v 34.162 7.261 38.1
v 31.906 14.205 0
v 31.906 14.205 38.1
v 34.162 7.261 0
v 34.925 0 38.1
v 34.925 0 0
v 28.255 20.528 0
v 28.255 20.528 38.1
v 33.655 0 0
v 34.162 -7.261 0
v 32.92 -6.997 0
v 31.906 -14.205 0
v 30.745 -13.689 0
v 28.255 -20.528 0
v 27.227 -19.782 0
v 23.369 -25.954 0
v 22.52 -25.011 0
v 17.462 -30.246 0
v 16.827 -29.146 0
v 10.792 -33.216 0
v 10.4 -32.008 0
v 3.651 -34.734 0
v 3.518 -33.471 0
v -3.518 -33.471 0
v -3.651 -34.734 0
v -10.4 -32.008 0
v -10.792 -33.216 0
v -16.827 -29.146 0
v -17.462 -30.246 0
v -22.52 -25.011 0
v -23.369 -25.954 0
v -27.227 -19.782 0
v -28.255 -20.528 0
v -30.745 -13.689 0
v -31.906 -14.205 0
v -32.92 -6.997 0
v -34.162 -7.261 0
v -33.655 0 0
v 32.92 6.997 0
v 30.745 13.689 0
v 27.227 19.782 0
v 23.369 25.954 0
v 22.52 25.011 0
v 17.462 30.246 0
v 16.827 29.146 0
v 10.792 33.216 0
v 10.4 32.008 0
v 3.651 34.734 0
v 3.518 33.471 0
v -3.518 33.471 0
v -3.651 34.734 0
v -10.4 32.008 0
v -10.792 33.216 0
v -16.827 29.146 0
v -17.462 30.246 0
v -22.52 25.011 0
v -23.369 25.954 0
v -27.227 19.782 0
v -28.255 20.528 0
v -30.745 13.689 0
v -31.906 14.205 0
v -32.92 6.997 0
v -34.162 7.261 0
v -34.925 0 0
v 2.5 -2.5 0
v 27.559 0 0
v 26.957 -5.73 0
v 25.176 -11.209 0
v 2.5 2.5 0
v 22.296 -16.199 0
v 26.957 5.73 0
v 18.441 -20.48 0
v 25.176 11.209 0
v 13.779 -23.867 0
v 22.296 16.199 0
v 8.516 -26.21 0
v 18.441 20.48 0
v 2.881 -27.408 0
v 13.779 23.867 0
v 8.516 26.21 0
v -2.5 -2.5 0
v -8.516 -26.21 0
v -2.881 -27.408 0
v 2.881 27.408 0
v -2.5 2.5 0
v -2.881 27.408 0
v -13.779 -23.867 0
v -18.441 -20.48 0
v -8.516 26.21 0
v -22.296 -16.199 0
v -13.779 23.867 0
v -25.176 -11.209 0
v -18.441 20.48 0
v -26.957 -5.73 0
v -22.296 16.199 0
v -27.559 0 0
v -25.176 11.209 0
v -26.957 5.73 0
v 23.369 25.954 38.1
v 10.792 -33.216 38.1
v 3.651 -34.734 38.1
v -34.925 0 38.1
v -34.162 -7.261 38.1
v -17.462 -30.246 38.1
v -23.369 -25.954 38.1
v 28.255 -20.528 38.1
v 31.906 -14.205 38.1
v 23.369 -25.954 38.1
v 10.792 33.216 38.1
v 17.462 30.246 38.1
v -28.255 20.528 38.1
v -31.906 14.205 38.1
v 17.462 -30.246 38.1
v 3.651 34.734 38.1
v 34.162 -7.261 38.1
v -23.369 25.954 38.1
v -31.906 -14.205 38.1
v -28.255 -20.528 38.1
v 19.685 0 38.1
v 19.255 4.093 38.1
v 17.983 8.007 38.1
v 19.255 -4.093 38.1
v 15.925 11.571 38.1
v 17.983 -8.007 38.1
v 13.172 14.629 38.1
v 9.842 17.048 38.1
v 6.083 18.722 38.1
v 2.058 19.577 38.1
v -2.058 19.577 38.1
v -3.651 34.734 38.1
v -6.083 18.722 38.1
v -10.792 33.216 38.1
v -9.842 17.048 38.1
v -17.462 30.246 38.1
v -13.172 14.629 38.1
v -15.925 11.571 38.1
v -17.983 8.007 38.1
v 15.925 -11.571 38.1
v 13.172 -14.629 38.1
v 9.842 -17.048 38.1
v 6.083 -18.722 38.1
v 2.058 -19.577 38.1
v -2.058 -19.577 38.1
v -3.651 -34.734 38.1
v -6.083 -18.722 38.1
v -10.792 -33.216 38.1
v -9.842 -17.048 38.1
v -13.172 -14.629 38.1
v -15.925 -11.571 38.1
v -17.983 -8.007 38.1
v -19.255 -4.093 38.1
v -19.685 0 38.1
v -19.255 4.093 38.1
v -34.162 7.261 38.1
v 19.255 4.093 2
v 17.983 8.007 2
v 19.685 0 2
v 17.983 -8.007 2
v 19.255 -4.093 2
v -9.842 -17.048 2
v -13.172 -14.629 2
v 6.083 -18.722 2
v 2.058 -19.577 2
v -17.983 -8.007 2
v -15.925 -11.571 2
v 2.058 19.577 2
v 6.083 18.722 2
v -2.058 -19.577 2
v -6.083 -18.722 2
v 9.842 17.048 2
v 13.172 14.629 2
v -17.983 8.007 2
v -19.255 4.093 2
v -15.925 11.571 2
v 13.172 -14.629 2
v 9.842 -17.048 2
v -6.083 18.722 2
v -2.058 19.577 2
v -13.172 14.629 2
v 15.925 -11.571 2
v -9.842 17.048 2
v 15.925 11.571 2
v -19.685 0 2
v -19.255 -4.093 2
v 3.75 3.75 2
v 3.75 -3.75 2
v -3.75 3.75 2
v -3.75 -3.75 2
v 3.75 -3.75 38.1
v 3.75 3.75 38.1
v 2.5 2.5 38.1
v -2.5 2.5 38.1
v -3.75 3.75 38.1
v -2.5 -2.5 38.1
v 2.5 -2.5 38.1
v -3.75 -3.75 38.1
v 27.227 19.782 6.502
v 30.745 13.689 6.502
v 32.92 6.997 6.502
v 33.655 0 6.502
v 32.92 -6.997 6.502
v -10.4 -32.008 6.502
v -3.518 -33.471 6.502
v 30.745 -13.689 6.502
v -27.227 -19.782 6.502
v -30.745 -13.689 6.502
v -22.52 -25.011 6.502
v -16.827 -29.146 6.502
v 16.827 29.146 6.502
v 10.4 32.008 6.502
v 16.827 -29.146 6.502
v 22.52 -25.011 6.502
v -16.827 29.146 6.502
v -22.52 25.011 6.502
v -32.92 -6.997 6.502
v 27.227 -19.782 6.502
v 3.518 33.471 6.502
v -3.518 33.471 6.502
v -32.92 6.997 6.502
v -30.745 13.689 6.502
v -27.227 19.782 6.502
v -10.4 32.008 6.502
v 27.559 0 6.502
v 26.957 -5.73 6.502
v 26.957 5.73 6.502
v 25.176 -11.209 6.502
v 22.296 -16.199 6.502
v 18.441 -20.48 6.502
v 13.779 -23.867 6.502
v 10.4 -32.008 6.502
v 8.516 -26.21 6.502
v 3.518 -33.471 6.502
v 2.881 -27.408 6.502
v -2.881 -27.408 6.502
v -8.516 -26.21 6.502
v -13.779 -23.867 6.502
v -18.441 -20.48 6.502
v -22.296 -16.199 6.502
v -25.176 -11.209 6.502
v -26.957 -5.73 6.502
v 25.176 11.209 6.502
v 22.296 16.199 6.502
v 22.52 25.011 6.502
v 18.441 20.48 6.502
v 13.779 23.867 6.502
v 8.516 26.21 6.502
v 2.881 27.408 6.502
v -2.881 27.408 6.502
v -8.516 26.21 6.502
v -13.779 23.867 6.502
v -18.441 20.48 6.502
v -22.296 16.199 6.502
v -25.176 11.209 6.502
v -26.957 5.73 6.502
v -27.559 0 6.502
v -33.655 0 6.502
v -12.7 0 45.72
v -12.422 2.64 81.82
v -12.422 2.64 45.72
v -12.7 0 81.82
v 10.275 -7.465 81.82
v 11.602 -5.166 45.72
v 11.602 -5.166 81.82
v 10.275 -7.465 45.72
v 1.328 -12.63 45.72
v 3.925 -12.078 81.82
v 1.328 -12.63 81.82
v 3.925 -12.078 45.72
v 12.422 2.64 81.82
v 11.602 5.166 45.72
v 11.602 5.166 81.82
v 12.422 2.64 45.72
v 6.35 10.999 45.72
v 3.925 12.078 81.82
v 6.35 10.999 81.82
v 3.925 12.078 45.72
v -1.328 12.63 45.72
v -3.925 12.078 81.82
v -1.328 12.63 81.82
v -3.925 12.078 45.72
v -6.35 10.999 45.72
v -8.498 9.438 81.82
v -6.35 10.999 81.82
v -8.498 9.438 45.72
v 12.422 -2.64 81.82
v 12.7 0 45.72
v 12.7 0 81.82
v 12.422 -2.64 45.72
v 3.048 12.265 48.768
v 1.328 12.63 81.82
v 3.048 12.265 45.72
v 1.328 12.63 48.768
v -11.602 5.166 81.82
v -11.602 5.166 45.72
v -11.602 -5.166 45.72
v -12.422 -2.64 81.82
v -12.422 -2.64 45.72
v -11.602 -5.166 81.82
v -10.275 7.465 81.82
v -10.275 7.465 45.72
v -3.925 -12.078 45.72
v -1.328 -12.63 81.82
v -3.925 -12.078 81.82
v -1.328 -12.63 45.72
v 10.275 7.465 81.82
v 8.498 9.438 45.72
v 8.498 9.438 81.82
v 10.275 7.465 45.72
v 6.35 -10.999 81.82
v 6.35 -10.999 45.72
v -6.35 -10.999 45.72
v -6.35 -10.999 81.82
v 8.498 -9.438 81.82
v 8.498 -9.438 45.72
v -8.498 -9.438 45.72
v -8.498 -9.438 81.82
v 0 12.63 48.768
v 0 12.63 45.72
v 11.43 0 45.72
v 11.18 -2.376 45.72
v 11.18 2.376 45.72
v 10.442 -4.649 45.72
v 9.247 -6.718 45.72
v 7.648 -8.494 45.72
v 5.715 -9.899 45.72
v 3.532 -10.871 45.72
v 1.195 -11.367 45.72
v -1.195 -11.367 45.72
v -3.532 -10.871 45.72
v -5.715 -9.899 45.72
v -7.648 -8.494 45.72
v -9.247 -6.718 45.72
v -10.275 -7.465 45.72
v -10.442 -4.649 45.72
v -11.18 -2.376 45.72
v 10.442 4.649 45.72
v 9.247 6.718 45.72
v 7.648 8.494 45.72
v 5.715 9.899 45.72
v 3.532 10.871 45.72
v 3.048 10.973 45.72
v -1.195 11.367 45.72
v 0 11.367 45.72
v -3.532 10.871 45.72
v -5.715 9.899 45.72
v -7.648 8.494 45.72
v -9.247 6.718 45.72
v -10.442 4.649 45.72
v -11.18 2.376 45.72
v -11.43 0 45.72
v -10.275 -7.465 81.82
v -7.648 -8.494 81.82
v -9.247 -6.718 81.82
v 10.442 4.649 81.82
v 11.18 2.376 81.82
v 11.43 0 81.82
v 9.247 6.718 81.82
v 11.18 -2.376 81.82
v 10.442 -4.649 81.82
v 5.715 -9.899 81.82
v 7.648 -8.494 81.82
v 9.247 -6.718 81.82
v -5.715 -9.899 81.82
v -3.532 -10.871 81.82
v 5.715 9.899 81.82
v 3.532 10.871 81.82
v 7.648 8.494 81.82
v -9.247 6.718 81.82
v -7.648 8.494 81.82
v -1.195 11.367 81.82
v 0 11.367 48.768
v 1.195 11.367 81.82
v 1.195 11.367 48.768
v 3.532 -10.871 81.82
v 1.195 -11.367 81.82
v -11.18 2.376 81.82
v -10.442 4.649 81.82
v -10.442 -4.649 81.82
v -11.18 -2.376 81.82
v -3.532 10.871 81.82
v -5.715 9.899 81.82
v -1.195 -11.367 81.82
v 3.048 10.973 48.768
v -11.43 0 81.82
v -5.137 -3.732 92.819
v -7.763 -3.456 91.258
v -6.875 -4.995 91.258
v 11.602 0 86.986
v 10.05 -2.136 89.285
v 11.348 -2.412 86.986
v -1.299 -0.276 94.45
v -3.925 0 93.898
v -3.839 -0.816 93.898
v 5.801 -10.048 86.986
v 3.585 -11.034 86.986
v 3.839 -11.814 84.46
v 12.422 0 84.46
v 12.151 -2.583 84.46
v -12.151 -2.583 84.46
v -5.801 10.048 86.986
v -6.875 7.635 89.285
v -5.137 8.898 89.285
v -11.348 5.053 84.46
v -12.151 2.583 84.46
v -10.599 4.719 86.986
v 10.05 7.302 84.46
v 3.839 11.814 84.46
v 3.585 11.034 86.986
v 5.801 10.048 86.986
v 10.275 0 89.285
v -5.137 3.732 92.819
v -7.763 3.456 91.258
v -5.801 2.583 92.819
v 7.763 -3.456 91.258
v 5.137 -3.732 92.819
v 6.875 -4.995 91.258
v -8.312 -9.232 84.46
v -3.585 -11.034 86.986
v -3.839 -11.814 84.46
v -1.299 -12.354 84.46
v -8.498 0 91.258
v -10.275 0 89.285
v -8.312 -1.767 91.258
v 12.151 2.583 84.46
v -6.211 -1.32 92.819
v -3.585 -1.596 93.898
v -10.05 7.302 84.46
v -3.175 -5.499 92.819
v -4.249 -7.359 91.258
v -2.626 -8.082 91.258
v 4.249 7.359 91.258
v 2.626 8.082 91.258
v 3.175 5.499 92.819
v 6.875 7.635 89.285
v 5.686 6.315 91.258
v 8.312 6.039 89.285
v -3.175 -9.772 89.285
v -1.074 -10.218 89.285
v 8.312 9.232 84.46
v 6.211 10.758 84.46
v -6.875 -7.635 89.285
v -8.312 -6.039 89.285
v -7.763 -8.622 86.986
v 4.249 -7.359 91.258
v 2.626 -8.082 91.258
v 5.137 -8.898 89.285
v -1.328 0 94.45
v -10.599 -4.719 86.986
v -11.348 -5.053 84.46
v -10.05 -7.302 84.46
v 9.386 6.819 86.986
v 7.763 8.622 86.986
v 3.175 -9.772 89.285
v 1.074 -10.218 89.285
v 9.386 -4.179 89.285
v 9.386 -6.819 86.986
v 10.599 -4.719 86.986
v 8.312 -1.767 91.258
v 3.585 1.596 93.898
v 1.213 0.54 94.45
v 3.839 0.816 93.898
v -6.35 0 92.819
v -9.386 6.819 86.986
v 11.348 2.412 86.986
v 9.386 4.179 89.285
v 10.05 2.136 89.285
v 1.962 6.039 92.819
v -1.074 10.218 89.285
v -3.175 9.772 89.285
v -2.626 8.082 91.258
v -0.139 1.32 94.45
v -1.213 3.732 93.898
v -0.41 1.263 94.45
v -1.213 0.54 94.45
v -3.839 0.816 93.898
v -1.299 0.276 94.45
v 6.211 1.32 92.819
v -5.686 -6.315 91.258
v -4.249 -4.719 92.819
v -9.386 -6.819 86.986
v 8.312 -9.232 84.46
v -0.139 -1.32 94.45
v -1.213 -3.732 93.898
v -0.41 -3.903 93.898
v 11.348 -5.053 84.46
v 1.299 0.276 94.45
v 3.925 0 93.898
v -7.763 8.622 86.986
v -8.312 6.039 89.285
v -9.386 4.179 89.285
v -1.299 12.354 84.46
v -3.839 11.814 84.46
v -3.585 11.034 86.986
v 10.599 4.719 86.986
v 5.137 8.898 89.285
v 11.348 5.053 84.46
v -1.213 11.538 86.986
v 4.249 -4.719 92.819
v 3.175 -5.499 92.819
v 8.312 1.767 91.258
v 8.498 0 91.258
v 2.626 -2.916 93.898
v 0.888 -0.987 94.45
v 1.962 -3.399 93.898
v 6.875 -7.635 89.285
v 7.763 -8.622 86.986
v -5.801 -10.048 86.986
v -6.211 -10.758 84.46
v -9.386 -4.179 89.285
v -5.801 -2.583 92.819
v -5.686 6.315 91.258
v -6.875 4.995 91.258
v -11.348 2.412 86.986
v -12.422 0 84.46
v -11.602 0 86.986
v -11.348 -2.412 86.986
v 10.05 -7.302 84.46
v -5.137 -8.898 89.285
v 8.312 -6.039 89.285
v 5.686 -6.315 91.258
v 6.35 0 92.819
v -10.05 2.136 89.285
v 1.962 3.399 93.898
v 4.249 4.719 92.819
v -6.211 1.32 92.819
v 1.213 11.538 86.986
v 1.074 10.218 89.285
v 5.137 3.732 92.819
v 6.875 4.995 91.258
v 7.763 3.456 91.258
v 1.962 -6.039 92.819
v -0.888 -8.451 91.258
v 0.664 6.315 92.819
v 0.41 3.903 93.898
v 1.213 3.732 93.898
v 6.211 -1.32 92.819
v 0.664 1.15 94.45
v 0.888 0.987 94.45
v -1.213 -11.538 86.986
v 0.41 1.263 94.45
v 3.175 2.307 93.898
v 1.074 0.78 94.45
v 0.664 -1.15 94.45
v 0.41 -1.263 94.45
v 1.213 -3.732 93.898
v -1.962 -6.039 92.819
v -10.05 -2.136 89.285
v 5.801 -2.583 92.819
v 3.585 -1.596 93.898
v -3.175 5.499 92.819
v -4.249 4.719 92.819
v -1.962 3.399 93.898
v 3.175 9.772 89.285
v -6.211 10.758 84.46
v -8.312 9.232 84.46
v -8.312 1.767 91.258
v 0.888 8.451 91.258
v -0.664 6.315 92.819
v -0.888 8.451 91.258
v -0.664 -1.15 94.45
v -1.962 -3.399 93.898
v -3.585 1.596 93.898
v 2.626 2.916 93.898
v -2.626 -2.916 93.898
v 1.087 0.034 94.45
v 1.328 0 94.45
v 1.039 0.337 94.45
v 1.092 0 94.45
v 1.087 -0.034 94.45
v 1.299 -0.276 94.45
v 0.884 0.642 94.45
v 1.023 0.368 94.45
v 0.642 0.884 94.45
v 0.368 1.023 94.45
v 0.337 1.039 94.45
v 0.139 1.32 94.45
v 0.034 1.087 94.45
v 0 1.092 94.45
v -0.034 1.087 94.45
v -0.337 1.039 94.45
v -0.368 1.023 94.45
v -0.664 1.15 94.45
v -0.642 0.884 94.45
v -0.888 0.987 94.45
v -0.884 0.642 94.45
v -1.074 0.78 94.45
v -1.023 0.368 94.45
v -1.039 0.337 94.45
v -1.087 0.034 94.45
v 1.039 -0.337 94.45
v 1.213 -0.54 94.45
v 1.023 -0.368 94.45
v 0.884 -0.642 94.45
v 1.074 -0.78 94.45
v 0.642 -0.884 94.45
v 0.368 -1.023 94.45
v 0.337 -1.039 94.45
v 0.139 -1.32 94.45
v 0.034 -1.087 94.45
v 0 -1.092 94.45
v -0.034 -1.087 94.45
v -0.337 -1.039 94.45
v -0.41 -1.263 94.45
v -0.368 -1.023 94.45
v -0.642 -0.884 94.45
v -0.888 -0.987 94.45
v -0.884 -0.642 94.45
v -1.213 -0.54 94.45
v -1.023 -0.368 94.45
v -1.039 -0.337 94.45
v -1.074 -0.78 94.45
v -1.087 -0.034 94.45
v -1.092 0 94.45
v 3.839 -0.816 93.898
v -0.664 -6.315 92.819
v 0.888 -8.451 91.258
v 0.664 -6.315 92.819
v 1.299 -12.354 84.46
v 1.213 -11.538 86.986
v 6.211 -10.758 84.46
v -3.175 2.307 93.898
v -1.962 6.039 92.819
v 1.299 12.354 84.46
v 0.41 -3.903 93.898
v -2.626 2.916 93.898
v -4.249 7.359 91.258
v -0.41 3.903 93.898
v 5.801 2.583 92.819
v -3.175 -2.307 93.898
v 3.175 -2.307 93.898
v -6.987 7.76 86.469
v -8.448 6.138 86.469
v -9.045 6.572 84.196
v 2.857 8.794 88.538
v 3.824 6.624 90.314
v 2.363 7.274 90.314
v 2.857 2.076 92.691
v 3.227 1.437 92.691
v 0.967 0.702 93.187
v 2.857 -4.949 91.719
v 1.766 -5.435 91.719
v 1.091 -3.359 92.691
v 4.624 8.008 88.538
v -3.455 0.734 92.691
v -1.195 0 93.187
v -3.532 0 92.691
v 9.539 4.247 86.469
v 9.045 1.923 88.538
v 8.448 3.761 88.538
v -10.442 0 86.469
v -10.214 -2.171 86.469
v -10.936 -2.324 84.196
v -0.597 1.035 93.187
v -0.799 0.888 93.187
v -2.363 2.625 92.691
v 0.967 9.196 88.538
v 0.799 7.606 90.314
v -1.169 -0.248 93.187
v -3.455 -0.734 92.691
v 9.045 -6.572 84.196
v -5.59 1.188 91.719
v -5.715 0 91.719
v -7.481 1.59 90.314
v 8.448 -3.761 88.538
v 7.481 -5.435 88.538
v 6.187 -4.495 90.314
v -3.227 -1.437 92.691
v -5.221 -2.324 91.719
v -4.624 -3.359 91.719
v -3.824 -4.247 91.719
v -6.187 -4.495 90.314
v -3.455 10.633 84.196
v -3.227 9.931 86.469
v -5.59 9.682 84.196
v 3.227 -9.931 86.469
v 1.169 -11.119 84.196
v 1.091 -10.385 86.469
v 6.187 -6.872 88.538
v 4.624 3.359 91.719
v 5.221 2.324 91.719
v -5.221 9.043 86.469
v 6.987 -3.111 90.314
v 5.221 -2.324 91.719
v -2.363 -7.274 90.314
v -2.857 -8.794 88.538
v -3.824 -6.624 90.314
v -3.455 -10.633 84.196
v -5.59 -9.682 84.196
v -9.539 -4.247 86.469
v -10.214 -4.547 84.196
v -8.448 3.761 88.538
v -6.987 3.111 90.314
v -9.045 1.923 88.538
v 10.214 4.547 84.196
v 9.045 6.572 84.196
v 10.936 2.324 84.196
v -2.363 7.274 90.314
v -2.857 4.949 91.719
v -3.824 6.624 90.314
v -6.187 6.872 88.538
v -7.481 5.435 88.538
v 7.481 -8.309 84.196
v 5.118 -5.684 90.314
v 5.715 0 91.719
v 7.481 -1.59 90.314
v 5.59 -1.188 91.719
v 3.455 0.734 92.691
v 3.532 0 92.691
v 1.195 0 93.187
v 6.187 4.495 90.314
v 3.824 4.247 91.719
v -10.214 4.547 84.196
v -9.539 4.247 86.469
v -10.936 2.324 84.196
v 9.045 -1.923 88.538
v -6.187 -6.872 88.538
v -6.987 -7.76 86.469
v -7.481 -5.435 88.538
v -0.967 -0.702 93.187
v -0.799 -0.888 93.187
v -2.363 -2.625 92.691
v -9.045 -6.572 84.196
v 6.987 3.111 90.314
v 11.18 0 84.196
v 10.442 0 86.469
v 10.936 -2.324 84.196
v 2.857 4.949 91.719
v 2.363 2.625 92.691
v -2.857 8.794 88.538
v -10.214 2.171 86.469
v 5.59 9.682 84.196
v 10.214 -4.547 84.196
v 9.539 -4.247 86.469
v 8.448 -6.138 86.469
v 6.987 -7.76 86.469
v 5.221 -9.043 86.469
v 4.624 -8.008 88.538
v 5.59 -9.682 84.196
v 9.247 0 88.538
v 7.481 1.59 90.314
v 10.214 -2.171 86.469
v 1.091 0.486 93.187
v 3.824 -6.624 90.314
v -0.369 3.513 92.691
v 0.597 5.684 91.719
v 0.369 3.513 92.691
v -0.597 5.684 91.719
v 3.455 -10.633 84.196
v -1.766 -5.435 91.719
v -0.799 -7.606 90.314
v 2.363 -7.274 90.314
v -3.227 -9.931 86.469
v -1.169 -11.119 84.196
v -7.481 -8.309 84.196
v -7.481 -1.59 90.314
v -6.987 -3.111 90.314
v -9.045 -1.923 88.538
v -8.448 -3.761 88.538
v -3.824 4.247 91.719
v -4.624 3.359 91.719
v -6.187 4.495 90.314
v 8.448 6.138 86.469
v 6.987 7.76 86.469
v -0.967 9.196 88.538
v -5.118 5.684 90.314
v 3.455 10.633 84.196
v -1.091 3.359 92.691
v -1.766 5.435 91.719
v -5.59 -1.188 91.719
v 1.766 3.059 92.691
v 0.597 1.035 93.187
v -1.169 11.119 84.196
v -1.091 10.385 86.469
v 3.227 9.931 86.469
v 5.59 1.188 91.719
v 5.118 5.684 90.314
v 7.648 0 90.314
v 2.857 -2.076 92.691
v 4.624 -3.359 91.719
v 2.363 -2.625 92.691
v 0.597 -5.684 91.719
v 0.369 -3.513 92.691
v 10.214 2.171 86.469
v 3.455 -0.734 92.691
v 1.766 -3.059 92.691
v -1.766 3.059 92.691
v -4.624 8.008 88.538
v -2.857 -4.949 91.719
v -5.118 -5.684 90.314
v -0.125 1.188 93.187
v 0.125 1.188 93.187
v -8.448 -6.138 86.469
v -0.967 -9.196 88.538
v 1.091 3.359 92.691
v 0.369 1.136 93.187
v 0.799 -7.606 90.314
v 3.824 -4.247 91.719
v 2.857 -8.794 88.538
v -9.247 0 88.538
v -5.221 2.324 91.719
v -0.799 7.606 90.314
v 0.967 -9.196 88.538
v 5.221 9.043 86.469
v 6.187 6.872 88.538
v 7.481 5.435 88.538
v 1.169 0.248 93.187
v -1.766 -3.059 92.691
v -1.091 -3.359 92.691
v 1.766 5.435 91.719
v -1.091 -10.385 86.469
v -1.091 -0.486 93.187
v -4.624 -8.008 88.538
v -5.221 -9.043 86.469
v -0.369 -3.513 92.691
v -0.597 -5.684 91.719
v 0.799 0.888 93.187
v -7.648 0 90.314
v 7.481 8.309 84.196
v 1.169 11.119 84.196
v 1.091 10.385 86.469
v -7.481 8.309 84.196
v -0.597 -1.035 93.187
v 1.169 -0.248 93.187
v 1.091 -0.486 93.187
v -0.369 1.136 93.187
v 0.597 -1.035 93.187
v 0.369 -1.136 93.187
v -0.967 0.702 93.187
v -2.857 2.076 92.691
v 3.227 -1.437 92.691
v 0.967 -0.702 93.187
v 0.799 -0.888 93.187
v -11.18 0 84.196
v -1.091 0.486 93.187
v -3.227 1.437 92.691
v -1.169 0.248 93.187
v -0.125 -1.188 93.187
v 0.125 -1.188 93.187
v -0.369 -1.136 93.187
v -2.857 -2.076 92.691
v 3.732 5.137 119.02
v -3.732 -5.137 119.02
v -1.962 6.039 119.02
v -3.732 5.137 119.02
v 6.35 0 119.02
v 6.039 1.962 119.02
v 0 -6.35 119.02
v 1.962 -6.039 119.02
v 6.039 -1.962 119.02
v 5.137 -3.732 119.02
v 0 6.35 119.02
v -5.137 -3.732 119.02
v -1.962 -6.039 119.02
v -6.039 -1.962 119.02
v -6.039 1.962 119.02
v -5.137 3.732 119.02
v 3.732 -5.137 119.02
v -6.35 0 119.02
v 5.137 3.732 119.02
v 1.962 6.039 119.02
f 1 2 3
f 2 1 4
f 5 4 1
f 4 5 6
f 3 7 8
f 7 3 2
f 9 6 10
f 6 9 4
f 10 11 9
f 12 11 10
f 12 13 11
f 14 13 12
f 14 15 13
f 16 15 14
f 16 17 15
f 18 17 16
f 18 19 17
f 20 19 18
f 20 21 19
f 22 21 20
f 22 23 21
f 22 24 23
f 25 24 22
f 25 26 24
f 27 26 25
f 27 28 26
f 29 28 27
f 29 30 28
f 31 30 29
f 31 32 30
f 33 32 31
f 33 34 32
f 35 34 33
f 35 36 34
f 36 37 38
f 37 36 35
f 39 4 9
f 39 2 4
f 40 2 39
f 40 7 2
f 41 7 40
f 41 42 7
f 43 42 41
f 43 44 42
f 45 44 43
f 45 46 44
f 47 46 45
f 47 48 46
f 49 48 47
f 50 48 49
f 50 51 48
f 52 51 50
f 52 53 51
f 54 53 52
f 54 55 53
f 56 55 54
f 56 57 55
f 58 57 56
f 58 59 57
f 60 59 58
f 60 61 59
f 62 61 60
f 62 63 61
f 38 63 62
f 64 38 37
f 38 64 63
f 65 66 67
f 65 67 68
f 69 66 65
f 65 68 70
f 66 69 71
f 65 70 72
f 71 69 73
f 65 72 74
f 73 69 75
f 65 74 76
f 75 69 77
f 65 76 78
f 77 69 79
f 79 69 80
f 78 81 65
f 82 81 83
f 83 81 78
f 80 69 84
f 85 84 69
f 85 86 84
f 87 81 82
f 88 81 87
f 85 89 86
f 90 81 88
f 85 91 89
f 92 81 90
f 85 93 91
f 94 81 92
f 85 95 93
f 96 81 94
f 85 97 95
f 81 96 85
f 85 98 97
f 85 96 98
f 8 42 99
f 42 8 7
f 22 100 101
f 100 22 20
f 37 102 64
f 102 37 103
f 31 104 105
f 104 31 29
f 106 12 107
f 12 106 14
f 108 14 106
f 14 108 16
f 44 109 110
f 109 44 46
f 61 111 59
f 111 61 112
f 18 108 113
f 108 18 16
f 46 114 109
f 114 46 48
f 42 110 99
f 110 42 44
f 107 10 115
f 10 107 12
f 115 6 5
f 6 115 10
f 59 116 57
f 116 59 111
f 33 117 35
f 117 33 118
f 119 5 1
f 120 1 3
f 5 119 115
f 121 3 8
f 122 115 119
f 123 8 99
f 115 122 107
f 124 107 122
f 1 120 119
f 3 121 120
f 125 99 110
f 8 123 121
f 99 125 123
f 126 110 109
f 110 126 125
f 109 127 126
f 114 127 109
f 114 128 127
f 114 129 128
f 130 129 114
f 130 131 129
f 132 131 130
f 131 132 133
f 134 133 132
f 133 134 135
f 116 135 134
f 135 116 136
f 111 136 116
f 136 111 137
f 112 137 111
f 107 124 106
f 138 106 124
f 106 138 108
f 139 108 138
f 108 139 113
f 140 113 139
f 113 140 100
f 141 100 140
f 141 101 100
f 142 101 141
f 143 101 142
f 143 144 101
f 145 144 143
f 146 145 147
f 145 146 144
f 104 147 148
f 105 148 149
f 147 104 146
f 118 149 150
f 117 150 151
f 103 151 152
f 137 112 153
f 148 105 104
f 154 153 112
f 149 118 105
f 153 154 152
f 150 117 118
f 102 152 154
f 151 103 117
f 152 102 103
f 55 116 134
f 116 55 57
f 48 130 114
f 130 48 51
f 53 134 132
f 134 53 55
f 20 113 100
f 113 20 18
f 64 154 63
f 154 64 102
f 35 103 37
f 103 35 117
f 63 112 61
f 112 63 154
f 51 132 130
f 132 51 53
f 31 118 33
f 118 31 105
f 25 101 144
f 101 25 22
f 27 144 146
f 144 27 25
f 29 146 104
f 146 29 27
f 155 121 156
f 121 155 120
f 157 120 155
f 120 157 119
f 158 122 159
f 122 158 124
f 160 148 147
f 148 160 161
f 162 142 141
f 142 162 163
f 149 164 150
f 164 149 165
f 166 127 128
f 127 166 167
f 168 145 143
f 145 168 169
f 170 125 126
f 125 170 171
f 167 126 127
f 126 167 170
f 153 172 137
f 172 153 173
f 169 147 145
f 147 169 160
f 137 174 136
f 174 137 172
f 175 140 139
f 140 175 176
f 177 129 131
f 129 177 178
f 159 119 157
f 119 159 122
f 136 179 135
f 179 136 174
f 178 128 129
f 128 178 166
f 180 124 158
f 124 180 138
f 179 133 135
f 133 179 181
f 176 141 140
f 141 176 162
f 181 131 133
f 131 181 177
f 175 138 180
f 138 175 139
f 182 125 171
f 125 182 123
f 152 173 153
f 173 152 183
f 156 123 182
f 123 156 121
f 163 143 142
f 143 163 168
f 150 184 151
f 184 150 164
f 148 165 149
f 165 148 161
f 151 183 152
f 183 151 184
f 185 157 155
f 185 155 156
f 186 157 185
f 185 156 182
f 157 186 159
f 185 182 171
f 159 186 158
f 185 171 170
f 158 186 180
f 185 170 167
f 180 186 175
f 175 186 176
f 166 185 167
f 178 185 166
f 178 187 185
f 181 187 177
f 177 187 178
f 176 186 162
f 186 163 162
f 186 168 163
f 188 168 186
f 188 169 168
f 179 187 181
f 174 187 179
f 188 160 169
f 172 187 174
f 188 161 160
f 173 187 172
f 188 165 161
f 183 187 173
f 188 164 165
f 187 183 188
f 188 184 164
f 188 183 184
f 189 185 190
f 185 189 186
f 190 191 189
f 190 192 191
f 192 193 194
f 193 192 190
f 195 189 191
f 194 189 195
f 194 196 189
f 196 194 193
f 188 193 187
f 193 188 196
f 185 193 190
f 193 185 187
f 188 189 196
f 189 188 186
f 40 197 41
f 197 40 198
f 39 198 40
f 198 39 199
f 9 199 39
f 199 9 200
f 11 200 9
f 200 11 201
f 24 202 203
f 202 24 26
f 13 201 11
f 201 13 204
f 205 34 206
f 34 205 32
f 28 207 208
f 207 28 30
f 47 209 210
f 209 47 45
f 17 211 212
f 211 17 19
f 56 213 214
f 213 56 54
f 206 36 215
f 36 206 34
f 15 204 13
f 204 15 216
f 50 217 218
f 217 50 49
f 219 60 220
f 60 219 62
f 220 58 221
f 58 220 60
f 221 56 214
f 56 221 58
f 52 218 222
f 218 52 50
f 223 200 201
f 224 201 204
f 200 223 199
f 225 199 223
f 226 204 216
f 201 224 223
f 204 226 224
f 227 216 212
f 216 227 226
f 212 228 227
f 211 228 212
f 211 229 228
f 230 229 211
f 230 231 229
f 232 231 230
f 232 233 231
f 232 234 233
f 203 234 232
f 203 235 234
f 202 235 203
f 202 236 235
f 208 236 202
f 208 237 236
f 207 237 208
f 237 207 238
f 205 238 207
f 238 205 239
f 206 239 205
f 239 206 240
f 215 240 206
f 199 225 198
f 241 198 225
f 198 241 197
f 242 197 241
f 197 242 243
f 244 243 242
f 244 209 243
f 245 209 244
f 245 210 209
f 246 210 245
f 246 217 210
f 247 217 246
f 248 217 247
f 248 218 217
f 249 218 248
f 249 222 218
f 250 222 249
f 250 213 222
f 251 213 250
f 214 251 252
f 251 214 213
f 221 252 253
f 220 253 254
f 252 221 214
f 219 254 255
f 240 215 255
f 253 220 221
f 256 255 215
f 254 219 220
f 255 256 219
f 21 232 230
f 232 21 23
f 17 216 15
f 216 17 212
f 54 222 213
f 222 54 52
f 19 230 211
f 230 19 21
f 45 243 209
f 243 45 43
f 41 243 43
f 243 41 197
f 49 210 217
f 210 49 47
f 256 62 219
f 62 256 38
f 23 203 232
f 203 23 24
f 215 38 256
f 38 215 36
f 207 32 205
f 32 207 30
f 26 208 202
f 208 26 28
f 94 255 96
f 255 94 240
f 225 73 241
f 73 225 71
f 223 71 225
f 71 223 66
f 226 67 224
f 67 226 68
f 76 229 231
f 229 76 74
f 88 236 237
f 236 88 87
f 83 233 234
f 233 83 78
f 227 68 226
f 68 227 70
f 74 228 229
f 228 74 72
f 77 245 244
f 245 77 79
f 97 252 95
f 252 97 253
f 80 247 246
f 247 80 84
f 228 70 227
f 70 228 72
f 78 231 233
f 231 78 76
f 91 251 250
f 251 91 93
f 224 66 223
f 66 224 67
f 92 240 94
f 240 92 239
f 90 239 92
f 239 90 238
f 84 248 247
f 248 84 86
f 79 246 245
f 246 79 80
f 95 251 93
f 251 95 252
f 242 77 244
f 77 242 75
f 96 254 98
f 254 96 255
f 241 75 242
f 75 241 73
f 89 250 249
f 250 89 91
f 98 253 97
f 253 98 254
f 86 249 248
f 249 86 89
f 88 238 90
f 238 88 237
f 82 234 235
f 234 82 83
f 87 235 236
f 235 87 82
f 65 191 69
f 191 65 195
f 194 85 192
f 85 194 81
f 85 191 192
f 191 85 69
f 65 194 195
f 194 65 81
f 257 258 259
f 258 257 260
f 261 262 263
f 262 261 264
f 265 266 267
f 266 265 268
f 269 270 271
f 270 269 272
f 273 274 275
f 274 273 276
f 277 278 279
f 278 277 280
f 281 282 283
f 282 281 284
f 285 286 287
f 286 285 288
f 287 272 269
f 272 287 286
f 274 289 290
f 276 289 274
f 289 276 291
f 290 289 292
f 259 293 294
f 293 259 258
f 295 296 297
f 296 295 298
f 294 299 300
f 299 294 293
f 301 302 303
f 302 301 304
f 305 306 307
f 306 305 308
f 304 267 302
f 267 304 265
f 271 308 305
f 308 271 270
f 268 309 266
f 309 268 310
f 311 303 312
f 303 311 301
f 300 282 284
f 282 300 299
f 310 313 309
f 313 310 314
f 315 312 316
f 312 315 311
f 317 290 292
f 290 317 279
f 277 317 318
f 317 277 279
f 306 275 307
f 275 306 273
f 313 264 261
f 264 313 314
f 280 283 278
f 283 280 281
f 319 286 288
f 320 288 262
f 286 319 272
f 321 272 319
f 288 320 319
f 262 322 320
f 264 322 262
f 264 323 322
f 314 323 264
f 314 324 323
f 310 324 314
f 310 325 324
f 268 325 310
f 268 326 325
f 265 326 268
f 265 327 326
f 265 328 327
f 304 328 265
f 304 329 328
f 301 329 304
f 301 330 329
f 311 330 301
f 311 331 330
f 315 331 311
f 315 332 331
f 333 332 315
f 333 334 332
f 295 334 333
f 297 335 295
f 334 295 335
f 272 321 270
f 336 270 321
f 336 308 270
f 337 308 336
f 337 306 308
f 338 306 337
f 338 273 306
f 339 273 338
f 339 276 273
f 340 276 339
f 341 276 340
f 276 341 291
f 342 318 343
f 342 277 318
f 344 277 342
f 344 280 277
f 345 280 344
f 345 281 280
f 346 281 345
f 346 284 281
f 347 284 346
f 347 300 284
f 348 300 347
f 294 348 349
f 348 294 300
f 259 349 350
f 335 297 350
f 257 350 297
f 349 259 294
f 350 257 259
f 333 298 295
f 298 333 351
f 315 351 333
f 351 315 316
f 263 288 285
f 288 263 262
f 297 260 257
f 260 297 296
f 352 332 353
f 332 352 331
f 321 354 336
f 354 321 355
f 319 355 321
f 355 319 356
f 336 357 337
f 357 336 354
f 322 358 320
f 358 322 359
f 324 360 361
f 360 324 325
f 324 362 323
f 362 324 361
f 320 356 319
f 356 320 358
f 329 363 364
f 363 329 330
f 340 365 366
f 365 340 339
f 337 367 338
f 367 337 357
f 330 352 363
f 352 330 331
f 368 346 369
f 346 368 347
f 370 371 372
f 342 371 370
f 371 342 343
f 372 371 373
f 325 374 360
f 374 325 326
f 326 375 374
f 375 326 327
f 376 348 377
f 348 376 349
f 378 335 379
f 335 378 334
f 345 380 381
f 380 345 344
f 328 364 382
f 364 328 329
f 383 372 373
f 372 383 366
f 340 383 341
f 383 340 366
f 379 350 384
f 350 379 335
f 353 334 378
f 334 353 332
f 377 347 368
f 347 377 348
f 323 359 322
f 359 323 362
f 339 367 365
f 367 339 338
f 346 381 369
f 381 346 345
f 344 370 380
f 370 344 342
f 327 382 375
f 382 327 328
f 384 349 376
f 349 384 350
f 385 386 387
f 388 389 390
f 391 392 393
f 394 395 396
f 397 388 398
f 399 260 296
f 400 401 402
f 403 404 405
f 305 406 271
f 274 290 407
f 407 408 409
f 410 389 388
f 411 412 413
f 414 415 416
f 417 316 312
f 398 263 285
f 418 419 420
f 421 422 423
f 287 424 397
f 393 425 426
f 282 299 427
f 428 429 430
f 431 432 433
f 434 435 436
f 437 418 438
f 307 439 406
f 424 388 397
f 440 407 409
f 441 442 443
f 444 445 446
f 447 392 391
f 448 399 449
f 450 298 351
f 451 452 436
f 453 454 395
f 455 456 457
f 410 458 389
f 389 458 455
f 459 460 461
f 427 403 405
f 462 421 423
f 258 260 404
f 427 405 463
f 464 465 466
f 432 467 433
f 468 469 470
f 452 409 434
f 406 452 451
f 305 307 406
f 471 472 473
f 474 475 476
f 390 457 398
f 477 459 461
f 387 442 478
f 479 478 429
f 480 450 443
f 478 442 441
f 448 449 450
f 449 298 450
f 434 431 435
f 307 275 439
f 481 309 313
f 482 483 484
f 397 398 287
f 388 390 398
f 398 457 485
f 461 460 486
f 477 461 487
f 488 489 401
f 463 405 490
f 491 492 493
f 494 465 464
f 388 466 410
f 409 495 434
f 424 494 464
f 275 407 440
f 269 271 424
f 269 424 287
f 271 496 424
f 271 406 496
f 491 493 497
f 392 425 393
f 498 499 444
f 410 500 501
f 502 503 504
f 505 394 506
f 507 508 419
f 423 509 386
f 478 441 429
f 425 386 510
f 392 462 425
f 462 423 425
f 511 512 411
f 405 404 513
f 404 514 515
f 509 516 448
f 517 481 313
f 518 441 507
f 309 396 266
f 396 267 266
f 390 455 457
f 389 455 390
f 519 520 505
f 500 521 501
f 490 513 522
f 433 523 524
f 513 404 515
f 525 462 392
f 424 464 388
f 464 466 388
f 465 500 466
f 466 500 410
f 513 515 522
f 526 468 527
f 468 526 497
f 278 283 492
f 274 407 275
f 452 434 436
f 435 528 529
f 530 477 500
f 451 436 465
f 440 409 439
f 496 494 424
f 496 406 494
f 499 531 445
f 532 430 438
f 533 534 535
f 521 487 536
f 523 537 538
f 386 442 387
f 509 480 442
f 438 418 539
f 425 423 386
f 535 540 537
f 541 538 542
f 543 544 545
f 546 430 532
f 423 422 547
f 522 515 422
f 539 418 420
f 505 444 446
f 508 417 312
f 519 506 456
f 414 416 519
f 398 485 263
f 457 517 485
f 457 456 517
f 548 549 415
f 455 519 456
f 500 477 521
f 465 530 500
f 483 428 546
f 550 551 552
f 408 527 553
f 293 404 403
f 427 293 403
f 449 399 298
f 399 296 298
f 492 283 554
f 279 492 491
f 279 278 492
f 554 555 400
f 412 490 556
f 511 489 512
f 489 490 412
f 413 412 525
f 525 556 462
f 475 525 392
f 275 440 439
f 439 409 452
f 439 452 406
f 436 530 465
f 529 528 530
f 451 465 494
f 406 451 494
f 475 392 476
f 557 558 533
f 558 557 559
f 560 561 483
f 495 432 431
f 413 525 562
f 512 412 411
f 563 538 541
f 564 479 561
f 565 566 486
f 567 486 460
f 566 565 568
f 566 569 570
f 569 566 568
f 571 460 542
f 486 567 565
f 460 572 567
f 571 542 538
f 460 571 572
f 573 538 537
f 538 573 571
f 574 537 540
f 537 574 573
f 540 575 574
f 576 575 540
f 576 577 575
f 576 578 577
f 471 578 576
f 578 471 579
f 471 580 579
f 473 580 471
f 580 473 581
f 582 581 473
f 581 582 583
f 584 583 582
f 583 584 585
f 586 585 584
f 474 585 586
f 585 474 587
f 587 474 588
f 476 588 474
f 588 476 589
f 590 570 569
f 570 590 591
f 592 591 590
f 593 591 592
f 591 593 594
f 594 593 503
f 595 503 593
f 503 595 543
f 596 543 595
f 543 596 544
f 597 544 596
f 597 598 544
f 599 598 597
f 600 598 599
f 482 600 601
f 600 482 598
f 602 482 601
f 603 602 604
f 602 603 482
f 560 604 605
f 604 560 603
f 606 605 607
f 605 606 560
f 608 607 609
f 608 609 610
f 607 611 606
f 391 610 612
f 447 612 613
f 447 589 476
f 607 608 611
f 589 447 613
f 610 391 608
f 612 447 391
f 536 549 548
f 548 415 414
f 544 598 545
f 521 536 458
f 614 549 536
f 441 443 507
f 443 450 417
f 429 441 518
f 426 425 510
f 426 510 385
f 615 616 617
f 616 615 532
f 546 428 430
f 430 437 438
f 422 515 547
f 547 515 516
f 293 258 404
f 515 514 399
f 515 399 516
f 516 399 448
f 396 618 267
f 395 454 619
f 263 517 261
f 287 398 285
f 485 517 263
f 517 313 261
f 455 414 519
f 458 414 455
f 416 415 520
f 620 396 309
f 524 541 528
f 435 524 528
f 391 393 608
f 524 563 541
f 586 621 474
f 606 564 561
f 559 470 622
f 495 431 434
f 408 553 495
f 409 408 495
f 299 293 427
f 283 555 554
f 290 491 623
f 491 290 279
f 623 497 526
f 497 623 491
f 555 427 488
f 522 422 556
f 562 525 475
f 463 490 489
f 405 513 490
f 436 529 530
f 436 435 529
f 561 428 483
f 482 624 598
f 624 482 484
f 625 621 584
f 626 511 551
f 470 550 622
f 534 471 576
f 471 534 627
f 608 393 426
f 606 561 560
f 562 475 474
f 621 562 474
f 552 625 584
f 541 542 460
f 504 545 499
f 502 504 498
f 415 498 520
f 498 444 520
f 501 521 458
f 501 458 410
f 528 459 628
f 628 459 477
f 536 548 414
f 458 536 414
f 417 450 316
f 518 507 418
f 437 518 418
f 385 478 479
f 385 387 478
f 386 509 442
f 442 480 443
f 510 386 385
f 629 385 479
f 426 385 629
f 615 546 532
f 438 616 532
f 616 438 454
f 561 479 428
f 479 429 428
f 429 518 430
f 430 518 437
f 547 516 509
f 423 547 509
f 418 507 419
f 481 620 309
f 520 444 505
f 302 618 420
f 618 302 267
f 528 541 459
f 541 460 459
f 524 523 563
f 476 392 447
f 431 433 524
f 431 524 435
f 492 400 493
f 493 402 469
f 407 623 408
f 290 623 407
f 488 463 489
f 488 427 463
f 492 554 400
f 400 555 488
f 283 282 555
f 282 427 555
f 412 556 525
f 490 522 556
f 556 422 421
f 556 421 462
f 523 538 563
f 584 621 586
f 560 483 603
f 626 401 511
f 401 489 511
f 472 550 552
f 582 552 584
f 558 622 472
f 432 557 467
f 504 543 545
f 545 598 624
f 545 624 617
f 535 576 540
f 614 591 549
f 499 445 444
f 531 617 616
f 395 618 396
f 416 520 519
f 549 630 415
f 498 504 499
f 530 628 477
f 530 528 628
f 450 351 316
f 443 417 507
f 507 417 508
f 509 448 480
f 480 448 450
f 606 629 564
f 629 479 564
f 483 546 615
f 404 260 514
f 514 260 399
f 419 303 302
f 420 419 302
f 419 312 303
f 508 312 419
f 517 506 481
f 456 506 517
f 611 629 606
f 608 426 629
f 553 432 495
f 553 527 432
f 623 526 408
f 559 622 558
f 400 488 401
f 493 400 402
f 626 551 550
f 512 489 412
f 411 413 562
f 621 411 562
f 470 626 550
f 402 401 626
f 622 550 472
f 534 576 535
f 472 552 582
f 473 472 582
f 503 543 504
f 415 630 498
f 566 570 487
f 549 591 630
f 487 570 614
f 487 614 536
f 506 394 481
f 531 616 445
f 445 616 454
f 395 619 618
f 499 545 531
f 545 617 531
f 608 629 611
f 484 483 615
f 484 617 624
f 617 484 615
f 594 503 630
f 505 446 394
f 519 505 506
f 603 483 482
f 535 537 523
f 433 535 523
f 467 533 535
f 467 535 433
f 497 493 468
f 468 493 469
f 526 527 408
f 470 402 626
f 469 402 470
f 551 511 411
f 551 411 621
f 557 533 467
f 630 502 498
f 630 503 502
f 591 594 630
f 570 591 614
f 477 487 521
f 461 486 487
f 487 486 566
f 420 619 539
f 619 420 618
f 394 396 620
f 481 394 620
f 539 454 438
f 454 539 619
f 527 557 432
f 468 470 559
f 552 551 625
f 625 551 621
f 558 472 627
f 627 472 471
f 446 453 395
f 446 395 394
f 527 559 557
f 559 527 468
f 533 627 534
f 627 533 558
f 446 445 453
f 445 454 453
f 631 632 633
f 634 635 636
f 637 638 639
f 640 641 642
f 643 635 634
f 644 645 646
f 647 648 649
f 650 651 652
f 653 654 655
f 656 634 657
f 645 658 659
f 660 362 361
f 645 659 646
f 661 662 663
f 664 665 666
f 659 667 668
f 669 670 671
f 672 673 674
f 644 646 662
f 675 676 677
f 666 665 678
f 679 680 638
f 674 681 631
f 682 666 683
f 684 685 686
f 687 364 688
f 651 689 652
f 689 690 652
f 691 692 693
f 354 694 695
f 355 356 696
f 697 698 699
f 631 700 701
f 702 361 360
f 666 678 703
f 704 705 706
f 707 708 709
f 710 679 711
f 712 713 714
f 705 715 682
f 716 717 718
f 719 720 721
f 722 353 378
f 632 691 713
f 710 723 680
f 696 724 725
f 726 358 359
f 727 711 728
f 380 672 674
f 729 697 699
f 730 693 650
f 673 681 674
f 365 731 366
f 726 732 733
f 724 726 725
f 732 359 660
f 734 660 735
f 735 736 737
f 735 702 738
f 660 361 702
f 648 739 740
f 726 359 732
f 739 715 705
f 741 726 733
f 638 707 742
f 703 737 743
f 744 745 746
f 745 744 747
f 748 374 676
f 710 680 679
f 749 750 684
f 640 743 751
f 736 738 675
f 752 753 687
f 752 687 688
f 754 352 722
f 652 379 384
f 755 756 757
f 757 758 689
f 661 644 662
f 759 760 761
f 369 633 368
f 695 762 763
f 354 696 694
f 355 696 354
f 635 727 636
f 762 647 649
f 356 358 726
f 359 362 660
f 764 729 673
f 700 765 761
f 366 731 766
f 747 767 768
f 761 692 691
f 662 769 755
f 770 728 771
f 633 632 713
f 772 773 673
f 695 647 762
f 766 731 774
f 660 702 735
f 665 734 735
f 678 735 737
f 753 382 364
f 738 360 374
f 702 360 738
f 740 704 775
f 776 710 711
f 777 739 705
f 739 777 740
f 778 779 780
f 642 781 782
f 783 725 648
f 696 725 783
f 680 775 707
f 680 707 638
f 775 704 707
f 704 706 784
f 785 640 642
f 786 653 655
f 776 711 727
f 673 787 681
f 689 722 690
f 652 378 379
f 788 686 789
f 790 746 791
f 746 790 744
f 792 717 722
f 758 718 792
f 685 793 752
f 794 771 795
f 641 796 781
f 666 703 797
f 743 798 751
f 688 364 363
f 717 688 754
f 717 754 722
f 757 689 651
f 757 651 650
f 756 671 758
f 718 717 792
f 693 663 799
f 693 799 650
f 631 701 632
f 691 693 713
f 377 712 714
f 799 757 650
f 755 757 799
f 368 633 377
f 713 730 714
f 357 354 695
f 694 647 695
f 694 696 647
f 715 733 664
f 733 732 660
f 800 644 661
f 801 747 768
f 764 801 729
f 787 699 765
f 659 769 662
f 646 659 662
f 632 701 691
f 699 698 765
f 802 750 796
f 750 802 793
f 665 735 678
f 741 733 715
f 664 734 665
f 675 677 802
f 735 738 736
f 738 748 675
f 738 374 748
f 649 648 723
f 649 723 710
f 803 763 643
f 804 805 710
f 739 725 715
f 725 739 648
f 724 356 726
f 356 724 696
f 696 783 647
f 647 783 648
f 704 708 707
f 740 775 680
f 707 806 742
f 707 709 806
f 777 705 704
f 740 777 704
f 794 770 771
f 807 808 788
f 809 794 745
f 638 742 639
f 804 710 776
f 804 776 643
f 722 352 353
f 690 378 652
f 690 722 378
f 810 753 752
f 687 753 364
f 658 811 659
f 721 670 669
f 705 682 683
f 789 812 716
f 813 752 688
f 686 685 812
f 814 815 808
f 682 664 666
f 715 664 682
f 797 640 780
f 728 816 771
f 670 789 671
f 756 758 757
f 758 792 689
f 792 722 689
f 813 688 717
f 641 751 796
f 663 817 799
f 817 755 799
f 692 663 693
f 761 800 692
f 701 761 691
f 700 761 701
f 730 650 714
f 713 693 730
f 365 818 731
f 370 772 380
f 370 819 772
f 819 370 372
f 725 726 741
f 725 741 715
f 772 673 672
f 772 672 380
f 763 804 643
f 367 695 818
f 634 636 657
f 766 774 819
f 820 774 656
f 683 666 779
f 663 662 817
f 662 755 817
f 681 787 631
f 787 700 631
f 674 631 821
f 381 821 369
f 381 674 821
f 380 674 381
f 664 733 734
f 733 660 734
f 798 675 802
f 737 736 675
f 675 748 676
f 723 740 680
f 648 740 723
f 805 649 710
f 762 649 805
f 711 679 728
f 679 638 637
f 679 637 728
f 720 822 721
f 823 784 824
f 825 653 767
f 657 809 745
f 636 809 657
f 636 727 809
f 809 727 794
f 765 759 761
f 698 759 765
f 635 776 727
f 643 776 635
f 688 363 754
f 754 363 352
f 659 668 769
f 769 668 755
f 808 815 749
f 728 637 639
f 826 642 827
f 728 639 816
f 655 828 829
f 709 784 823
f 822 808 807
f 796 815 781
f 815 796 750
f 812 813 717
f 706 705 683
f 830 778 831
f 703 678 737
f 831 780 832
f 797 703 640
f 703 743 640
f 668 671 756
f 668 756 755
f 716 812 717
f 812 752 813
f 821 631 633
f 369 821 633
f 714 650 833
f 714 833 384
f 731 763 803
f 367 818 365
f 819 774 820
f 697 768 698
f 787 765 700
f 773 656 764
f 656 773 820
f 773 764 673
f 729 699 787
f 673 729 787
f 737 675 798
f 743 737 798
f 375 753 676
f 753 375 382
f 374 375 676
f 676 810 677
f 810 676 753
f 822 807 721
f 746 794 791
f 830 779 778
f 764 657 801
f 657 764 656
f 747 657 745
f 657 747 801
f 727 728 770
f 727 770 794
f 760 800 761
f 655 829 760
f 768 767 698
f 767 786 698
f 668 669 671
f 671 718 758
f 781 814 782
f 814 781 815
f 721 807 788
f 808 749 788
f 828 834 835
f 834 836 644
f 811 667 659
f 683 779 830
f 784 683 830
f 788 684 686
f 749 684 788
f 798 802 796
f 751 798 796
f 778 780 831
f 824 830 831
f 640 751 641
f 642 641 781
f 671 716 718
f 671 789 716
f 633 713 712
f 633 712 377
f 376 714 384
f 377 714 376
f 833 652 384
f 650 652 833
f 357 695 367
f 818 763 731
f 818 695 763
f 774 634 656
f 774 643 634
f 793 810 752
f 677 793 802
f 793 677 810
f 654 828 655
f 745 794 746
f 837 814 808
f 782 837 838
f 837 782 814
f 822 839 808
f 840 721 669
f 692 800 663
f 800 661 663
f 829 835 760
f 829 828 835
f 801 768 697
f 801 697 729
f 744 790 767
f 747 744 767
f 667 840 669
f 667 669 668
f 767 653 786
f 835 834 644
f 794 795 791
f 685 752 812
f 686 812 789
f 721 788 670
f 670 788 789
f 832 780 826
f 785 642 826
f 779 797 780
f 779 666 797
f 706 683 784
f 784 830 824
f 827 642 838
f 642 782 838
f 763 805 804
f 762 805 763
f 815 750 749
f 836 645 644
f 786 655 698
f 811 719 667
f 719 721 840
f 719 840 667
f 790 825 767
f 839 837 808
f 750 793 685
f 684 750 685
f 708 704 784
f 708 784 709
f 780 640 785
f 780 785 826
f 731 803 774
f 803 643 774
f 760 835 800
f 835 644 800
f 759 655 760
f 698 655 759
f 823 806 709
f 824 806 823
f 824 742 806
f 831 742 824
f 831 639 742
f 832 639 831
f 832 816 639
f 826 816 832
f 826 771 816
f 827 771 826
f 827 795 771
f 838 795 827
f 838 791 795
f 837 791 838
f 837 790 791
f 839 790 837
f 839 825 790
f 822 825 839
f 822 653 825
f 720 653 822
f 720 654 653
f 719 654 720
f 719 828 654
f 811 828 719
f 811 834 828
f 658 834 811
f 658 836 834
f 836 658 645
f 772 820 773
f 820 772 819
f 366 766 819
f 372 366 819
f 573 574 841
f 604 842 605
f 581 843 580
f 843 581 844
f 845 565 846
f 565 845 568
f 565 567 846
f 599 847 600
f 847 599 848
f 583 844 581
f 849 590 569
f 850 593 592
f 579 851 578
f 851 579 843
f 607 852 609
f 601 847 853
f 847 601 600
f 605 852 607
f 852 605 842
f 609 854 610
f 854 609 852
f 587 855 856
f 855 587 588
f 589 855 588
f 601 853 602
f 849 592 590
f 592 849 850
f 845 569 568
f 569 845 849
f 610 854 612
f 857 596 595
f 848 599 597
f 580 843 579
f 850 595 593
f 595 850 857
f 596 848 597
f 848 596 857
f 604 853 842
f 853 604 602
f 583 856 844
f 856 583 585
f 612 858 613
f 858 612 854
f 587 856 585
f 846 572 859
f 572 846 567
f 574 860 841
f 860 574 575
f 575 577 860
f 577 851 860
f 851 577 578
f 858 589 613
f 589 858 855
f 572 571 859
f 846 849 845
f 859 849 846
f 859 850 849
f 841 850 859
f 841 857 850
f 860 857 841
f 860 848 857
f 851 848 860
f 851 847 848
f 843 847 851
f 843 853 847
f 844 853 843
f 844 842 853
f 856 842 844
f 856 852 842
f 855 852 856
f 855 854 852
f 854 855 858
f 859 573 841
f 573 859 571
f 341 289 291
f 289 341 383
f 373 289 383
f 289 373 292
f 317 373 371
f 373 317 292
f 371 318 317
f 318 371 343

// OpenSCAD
// file: shapes.scad
/*
 *  OpenSCAD Shapes Library (www.openscad.at)
 *  Copyright (C) 2009  Catarina Mota <clifford@clifford.at>
 *
 *  This program is free software; you can redistribute it and/or modify
 *  it under the terms of the GNU General Public License as published by
 *  the Free Software Foundation; either version 2 of the License, or
 *  (at your option) any later version.
 *
 *  This program is distributed in the hope that it will be useful,
 *  but WITHOUT ANY WARRANTY; without even the implied warranty of
 *  MERCHANTABILITY or FITNESS FOR A PARTICULAR PURPOSE.  See the
 *  GNU General Public License for more details.
 *
 *  You should have received a copy of the GNU General Public License
 *  along with this program; if not, write to the Free Software
 *  Foundation, Inc., 59 Temple Place, Suite 330, Boston, MA  02111-1307  USA
 *
*/


//box(width, height, depth);
//roundedBox(width, height, depth, factor);
//cone(height, radius);
//oval(width, height, depth);
//tube(height, radius, wall);
//ovalTube(width, height, depth, wall);
//hexagon(height, depth);
//octagon(height, depth);
//dodecagon(height, depth);
//hexagram(height, depth);
//rightTriangle(adjacent, opposite, depth);
//equiTriangle(side, depth);
//12ptStar(height, depth);

//----------------------

//roundedBox(120, 60, 3, 8);

//----------------------

module box(w,h,d) {
	scale ([w,h,d]) cube(1, true);
}

module roundedBox(w,h,d,f){
	difference(){
		box(w,h,d);
		translate([-w/2,h/2,0]) cube(w/(f/2),true);
		translate([w/2,h/2,0]) cube(w/(f/2),true);
		translate([-w/2,-h/2,0]) cube(w/(f/2),true);
		translate([w/2,-h/2,0]) cube(w/(f/2),true);
	}
	translate([-w/2+w/f,h/2-w/f,-d/2]) cylinder(d,w/f, w/f);
	translate([w/2-w/f,h/2-w/f,-d/2]) cylinder(d,w/f, w/f);
	translate([-w/2+w/f,-h/2+w/f,-d/2]) cylinder(d,w/f, w/f);
	translate([w/2-w/f,-h/2+w/f,-d/2]) cylinder(d,w/f, w/f);
}

module cone(height, radius) {
		cylinder(height, radius, 0);
}

module oval(w,h,d) {
	scale ([w/100, h/100, 1]) cylinder(d, 50, 50);
}

module tube(height, radius, wall) {
	difference(){
		cylinder(height, radius, radius);
		cylinder(height, radius-wall, radius-wall);
	}
}

module ovalTube(w,h,d,wall) {
	difference(){
		scale ([w/100, h/100, 1]) cylinder(d, 50, 50);
		scale ([w/100, h/100, 1]) cylinder(d, 50-wall, 50-wall);
	}
}

module hexagon(height, depth) {
	boxWidth=height/1.75;
		union(){
			box(boxWidth, height, depth);
			rotate([0,0,60]) box(boxWidth, height, depth);
			rotate([0,0,-60]) box(boxWidth, height, depth);
		}
}

module octagon(height, depth) {
	intersection(){
		box(height, height, depth);
		rotate([0,0,45]) box(height, height, depth);
	}
}

module dodecagon(height, depth) {
	intersection(){
		hexagon(height, depth);
		rotate([0,0,90]) hexagon(height, depth);
	}
}

module hexagram(height, depth) {
	boxWidth=height/1.75;
	intersection(){
		box(height, boxWidth, depth);
		rotate([0,0,60]) box(height, boxWidth, depth);
	}
	intersection(){
		box(height, boxWidth, depth);
		rotate([0,0,-60]) box(height, boxWidth, depth);
	}
	intersection(){
		rotate([0,0,60]) box(height, boxWidth, depth);
		rotate([0,0,-60]) box(height, boxWidth, depth);
	}
}

module rightTriangle(adjacent, opposite, depth) {
	difference(){
		translate([-adjacent/2,opposite/2,0]) box(adjacent, opposite, depth);
		translate([-adjacent,0,0]){
			rotate([0,0,atan(opposite/adjacent)]) dislocateBox(adjacent*2, opposite, depth);
		}
	}
}

module equiTriangle(side, depth) {
	difference(){
		translate([-side/2,side/2,0]) box(side, side, depth);
		rotate([0,0,30]) dislocateBox(side*2, side, depth);
		translate([-side,0,0]){
			rotate([0,0,60]) dislocateBox(side*2, side, depth);
		}
	}
}

module 12ptStar(height, depth) {
	starNum=3;
	starAngle=360/starNum;
	for (s=[1:starNum]){
		rotate([0, 0, s*starAngle]) box(height, height, depth);
	}
}

//-----------------------
//MOVES THE ROTATION AXIS OF A BOX FROM ITS CENTER TO THE BOTTOM LEFT CORNER
module dislocateBox(w,h,d){
	translate([w/2,h,0]){
		difference(){
			box(w, h*2, d+1);
			translate([-w,0,0]) box(w, h*2, d+1);
		}
	}
}
// main file
/*
This is for a "burper" that fits on top of the old style BALL canning jars. This can be
used for fermenting most anythng in small batches. It will prevent air from getting in when the middle ring is filled with water. The water must be above the notch in the top.
Thank you to Catarina Mota (yet again) for her shapes.scad file!!
*/
include <shapes.scad>

mm_per_inch = 25.4;
rim_height = 0.256*mm_per_inch;
cap_height = 1.5*mm_per_inch;
bottom_thickness = 2; //in millimiters
jar_outside_radius = (2.75*mm_per_inch)/2;
rim_outside_radius = (2.65*mm_per_inch)/2;
rim_thickness = 0.24*mm_per_inch;
inside_well_height = cap_height-bottom_thickness;
//inside_well_height = 0.4*mm_per_inch;
inside_well_radius = (2.25*mm_per_inch)/2;
inside_well_width = 0.85*mm_per_inch;
cap_radius = (1*mm_per_inch)/2;
cap_wall_thickness = jar_outside_radius-rim_outside_radius;
exhaust_width = 5;
wall_thickness = 0.6*mm_per_inch;

difference ()
	{
	union ()
		{
		tube(cap_height, jar_outside_radius, wall_thickness);
		cylinder (h = bottom_thickness,r = jar_outside_radius); //bottom
		translate ([0,0,cap_height/2]) cube (size=[exhaust_width*1.5,exhaust_width*1.5,cap_height],center=true); //exhaust tube outside
		}
	translate ([0,0,cap_height/2]) cube (size=[exhaust_width,exhaust_width,cap_height],center=true); //exhaust tube
	tube(rim_height, rim_outside_radius, rim_thickness); //rim for jar
	}

//cap is here
translate ([0,0,cap_height*1.2]) difference ()
	{
	union ()
		{
		tube (inside_well_height, cap_radius, cap_wall_thickness);
		difference ()
			{
			translate ([0,0,inside_well_height]) sphere (r=cap_radius);
			translate ([0,0,inside_well_height]) sphere (r=cap_radius-cap_wall_thickness);
			translate ([0,0,-(inside_well_height*2.5)]) cylinder (h=inside_well_height*3.5, r=cap_radius);
			}
		translate ([0,0,inside_well_height+cap_radius-0.5]) cylinder (h=25, r1=1,r2=cap_radius/2); //handle
		}
	translate ([0,cap_radius/2,0]) cube ([rim_thickness / 2,rim_thickness*2,rim_thickness / 2]);
	}
